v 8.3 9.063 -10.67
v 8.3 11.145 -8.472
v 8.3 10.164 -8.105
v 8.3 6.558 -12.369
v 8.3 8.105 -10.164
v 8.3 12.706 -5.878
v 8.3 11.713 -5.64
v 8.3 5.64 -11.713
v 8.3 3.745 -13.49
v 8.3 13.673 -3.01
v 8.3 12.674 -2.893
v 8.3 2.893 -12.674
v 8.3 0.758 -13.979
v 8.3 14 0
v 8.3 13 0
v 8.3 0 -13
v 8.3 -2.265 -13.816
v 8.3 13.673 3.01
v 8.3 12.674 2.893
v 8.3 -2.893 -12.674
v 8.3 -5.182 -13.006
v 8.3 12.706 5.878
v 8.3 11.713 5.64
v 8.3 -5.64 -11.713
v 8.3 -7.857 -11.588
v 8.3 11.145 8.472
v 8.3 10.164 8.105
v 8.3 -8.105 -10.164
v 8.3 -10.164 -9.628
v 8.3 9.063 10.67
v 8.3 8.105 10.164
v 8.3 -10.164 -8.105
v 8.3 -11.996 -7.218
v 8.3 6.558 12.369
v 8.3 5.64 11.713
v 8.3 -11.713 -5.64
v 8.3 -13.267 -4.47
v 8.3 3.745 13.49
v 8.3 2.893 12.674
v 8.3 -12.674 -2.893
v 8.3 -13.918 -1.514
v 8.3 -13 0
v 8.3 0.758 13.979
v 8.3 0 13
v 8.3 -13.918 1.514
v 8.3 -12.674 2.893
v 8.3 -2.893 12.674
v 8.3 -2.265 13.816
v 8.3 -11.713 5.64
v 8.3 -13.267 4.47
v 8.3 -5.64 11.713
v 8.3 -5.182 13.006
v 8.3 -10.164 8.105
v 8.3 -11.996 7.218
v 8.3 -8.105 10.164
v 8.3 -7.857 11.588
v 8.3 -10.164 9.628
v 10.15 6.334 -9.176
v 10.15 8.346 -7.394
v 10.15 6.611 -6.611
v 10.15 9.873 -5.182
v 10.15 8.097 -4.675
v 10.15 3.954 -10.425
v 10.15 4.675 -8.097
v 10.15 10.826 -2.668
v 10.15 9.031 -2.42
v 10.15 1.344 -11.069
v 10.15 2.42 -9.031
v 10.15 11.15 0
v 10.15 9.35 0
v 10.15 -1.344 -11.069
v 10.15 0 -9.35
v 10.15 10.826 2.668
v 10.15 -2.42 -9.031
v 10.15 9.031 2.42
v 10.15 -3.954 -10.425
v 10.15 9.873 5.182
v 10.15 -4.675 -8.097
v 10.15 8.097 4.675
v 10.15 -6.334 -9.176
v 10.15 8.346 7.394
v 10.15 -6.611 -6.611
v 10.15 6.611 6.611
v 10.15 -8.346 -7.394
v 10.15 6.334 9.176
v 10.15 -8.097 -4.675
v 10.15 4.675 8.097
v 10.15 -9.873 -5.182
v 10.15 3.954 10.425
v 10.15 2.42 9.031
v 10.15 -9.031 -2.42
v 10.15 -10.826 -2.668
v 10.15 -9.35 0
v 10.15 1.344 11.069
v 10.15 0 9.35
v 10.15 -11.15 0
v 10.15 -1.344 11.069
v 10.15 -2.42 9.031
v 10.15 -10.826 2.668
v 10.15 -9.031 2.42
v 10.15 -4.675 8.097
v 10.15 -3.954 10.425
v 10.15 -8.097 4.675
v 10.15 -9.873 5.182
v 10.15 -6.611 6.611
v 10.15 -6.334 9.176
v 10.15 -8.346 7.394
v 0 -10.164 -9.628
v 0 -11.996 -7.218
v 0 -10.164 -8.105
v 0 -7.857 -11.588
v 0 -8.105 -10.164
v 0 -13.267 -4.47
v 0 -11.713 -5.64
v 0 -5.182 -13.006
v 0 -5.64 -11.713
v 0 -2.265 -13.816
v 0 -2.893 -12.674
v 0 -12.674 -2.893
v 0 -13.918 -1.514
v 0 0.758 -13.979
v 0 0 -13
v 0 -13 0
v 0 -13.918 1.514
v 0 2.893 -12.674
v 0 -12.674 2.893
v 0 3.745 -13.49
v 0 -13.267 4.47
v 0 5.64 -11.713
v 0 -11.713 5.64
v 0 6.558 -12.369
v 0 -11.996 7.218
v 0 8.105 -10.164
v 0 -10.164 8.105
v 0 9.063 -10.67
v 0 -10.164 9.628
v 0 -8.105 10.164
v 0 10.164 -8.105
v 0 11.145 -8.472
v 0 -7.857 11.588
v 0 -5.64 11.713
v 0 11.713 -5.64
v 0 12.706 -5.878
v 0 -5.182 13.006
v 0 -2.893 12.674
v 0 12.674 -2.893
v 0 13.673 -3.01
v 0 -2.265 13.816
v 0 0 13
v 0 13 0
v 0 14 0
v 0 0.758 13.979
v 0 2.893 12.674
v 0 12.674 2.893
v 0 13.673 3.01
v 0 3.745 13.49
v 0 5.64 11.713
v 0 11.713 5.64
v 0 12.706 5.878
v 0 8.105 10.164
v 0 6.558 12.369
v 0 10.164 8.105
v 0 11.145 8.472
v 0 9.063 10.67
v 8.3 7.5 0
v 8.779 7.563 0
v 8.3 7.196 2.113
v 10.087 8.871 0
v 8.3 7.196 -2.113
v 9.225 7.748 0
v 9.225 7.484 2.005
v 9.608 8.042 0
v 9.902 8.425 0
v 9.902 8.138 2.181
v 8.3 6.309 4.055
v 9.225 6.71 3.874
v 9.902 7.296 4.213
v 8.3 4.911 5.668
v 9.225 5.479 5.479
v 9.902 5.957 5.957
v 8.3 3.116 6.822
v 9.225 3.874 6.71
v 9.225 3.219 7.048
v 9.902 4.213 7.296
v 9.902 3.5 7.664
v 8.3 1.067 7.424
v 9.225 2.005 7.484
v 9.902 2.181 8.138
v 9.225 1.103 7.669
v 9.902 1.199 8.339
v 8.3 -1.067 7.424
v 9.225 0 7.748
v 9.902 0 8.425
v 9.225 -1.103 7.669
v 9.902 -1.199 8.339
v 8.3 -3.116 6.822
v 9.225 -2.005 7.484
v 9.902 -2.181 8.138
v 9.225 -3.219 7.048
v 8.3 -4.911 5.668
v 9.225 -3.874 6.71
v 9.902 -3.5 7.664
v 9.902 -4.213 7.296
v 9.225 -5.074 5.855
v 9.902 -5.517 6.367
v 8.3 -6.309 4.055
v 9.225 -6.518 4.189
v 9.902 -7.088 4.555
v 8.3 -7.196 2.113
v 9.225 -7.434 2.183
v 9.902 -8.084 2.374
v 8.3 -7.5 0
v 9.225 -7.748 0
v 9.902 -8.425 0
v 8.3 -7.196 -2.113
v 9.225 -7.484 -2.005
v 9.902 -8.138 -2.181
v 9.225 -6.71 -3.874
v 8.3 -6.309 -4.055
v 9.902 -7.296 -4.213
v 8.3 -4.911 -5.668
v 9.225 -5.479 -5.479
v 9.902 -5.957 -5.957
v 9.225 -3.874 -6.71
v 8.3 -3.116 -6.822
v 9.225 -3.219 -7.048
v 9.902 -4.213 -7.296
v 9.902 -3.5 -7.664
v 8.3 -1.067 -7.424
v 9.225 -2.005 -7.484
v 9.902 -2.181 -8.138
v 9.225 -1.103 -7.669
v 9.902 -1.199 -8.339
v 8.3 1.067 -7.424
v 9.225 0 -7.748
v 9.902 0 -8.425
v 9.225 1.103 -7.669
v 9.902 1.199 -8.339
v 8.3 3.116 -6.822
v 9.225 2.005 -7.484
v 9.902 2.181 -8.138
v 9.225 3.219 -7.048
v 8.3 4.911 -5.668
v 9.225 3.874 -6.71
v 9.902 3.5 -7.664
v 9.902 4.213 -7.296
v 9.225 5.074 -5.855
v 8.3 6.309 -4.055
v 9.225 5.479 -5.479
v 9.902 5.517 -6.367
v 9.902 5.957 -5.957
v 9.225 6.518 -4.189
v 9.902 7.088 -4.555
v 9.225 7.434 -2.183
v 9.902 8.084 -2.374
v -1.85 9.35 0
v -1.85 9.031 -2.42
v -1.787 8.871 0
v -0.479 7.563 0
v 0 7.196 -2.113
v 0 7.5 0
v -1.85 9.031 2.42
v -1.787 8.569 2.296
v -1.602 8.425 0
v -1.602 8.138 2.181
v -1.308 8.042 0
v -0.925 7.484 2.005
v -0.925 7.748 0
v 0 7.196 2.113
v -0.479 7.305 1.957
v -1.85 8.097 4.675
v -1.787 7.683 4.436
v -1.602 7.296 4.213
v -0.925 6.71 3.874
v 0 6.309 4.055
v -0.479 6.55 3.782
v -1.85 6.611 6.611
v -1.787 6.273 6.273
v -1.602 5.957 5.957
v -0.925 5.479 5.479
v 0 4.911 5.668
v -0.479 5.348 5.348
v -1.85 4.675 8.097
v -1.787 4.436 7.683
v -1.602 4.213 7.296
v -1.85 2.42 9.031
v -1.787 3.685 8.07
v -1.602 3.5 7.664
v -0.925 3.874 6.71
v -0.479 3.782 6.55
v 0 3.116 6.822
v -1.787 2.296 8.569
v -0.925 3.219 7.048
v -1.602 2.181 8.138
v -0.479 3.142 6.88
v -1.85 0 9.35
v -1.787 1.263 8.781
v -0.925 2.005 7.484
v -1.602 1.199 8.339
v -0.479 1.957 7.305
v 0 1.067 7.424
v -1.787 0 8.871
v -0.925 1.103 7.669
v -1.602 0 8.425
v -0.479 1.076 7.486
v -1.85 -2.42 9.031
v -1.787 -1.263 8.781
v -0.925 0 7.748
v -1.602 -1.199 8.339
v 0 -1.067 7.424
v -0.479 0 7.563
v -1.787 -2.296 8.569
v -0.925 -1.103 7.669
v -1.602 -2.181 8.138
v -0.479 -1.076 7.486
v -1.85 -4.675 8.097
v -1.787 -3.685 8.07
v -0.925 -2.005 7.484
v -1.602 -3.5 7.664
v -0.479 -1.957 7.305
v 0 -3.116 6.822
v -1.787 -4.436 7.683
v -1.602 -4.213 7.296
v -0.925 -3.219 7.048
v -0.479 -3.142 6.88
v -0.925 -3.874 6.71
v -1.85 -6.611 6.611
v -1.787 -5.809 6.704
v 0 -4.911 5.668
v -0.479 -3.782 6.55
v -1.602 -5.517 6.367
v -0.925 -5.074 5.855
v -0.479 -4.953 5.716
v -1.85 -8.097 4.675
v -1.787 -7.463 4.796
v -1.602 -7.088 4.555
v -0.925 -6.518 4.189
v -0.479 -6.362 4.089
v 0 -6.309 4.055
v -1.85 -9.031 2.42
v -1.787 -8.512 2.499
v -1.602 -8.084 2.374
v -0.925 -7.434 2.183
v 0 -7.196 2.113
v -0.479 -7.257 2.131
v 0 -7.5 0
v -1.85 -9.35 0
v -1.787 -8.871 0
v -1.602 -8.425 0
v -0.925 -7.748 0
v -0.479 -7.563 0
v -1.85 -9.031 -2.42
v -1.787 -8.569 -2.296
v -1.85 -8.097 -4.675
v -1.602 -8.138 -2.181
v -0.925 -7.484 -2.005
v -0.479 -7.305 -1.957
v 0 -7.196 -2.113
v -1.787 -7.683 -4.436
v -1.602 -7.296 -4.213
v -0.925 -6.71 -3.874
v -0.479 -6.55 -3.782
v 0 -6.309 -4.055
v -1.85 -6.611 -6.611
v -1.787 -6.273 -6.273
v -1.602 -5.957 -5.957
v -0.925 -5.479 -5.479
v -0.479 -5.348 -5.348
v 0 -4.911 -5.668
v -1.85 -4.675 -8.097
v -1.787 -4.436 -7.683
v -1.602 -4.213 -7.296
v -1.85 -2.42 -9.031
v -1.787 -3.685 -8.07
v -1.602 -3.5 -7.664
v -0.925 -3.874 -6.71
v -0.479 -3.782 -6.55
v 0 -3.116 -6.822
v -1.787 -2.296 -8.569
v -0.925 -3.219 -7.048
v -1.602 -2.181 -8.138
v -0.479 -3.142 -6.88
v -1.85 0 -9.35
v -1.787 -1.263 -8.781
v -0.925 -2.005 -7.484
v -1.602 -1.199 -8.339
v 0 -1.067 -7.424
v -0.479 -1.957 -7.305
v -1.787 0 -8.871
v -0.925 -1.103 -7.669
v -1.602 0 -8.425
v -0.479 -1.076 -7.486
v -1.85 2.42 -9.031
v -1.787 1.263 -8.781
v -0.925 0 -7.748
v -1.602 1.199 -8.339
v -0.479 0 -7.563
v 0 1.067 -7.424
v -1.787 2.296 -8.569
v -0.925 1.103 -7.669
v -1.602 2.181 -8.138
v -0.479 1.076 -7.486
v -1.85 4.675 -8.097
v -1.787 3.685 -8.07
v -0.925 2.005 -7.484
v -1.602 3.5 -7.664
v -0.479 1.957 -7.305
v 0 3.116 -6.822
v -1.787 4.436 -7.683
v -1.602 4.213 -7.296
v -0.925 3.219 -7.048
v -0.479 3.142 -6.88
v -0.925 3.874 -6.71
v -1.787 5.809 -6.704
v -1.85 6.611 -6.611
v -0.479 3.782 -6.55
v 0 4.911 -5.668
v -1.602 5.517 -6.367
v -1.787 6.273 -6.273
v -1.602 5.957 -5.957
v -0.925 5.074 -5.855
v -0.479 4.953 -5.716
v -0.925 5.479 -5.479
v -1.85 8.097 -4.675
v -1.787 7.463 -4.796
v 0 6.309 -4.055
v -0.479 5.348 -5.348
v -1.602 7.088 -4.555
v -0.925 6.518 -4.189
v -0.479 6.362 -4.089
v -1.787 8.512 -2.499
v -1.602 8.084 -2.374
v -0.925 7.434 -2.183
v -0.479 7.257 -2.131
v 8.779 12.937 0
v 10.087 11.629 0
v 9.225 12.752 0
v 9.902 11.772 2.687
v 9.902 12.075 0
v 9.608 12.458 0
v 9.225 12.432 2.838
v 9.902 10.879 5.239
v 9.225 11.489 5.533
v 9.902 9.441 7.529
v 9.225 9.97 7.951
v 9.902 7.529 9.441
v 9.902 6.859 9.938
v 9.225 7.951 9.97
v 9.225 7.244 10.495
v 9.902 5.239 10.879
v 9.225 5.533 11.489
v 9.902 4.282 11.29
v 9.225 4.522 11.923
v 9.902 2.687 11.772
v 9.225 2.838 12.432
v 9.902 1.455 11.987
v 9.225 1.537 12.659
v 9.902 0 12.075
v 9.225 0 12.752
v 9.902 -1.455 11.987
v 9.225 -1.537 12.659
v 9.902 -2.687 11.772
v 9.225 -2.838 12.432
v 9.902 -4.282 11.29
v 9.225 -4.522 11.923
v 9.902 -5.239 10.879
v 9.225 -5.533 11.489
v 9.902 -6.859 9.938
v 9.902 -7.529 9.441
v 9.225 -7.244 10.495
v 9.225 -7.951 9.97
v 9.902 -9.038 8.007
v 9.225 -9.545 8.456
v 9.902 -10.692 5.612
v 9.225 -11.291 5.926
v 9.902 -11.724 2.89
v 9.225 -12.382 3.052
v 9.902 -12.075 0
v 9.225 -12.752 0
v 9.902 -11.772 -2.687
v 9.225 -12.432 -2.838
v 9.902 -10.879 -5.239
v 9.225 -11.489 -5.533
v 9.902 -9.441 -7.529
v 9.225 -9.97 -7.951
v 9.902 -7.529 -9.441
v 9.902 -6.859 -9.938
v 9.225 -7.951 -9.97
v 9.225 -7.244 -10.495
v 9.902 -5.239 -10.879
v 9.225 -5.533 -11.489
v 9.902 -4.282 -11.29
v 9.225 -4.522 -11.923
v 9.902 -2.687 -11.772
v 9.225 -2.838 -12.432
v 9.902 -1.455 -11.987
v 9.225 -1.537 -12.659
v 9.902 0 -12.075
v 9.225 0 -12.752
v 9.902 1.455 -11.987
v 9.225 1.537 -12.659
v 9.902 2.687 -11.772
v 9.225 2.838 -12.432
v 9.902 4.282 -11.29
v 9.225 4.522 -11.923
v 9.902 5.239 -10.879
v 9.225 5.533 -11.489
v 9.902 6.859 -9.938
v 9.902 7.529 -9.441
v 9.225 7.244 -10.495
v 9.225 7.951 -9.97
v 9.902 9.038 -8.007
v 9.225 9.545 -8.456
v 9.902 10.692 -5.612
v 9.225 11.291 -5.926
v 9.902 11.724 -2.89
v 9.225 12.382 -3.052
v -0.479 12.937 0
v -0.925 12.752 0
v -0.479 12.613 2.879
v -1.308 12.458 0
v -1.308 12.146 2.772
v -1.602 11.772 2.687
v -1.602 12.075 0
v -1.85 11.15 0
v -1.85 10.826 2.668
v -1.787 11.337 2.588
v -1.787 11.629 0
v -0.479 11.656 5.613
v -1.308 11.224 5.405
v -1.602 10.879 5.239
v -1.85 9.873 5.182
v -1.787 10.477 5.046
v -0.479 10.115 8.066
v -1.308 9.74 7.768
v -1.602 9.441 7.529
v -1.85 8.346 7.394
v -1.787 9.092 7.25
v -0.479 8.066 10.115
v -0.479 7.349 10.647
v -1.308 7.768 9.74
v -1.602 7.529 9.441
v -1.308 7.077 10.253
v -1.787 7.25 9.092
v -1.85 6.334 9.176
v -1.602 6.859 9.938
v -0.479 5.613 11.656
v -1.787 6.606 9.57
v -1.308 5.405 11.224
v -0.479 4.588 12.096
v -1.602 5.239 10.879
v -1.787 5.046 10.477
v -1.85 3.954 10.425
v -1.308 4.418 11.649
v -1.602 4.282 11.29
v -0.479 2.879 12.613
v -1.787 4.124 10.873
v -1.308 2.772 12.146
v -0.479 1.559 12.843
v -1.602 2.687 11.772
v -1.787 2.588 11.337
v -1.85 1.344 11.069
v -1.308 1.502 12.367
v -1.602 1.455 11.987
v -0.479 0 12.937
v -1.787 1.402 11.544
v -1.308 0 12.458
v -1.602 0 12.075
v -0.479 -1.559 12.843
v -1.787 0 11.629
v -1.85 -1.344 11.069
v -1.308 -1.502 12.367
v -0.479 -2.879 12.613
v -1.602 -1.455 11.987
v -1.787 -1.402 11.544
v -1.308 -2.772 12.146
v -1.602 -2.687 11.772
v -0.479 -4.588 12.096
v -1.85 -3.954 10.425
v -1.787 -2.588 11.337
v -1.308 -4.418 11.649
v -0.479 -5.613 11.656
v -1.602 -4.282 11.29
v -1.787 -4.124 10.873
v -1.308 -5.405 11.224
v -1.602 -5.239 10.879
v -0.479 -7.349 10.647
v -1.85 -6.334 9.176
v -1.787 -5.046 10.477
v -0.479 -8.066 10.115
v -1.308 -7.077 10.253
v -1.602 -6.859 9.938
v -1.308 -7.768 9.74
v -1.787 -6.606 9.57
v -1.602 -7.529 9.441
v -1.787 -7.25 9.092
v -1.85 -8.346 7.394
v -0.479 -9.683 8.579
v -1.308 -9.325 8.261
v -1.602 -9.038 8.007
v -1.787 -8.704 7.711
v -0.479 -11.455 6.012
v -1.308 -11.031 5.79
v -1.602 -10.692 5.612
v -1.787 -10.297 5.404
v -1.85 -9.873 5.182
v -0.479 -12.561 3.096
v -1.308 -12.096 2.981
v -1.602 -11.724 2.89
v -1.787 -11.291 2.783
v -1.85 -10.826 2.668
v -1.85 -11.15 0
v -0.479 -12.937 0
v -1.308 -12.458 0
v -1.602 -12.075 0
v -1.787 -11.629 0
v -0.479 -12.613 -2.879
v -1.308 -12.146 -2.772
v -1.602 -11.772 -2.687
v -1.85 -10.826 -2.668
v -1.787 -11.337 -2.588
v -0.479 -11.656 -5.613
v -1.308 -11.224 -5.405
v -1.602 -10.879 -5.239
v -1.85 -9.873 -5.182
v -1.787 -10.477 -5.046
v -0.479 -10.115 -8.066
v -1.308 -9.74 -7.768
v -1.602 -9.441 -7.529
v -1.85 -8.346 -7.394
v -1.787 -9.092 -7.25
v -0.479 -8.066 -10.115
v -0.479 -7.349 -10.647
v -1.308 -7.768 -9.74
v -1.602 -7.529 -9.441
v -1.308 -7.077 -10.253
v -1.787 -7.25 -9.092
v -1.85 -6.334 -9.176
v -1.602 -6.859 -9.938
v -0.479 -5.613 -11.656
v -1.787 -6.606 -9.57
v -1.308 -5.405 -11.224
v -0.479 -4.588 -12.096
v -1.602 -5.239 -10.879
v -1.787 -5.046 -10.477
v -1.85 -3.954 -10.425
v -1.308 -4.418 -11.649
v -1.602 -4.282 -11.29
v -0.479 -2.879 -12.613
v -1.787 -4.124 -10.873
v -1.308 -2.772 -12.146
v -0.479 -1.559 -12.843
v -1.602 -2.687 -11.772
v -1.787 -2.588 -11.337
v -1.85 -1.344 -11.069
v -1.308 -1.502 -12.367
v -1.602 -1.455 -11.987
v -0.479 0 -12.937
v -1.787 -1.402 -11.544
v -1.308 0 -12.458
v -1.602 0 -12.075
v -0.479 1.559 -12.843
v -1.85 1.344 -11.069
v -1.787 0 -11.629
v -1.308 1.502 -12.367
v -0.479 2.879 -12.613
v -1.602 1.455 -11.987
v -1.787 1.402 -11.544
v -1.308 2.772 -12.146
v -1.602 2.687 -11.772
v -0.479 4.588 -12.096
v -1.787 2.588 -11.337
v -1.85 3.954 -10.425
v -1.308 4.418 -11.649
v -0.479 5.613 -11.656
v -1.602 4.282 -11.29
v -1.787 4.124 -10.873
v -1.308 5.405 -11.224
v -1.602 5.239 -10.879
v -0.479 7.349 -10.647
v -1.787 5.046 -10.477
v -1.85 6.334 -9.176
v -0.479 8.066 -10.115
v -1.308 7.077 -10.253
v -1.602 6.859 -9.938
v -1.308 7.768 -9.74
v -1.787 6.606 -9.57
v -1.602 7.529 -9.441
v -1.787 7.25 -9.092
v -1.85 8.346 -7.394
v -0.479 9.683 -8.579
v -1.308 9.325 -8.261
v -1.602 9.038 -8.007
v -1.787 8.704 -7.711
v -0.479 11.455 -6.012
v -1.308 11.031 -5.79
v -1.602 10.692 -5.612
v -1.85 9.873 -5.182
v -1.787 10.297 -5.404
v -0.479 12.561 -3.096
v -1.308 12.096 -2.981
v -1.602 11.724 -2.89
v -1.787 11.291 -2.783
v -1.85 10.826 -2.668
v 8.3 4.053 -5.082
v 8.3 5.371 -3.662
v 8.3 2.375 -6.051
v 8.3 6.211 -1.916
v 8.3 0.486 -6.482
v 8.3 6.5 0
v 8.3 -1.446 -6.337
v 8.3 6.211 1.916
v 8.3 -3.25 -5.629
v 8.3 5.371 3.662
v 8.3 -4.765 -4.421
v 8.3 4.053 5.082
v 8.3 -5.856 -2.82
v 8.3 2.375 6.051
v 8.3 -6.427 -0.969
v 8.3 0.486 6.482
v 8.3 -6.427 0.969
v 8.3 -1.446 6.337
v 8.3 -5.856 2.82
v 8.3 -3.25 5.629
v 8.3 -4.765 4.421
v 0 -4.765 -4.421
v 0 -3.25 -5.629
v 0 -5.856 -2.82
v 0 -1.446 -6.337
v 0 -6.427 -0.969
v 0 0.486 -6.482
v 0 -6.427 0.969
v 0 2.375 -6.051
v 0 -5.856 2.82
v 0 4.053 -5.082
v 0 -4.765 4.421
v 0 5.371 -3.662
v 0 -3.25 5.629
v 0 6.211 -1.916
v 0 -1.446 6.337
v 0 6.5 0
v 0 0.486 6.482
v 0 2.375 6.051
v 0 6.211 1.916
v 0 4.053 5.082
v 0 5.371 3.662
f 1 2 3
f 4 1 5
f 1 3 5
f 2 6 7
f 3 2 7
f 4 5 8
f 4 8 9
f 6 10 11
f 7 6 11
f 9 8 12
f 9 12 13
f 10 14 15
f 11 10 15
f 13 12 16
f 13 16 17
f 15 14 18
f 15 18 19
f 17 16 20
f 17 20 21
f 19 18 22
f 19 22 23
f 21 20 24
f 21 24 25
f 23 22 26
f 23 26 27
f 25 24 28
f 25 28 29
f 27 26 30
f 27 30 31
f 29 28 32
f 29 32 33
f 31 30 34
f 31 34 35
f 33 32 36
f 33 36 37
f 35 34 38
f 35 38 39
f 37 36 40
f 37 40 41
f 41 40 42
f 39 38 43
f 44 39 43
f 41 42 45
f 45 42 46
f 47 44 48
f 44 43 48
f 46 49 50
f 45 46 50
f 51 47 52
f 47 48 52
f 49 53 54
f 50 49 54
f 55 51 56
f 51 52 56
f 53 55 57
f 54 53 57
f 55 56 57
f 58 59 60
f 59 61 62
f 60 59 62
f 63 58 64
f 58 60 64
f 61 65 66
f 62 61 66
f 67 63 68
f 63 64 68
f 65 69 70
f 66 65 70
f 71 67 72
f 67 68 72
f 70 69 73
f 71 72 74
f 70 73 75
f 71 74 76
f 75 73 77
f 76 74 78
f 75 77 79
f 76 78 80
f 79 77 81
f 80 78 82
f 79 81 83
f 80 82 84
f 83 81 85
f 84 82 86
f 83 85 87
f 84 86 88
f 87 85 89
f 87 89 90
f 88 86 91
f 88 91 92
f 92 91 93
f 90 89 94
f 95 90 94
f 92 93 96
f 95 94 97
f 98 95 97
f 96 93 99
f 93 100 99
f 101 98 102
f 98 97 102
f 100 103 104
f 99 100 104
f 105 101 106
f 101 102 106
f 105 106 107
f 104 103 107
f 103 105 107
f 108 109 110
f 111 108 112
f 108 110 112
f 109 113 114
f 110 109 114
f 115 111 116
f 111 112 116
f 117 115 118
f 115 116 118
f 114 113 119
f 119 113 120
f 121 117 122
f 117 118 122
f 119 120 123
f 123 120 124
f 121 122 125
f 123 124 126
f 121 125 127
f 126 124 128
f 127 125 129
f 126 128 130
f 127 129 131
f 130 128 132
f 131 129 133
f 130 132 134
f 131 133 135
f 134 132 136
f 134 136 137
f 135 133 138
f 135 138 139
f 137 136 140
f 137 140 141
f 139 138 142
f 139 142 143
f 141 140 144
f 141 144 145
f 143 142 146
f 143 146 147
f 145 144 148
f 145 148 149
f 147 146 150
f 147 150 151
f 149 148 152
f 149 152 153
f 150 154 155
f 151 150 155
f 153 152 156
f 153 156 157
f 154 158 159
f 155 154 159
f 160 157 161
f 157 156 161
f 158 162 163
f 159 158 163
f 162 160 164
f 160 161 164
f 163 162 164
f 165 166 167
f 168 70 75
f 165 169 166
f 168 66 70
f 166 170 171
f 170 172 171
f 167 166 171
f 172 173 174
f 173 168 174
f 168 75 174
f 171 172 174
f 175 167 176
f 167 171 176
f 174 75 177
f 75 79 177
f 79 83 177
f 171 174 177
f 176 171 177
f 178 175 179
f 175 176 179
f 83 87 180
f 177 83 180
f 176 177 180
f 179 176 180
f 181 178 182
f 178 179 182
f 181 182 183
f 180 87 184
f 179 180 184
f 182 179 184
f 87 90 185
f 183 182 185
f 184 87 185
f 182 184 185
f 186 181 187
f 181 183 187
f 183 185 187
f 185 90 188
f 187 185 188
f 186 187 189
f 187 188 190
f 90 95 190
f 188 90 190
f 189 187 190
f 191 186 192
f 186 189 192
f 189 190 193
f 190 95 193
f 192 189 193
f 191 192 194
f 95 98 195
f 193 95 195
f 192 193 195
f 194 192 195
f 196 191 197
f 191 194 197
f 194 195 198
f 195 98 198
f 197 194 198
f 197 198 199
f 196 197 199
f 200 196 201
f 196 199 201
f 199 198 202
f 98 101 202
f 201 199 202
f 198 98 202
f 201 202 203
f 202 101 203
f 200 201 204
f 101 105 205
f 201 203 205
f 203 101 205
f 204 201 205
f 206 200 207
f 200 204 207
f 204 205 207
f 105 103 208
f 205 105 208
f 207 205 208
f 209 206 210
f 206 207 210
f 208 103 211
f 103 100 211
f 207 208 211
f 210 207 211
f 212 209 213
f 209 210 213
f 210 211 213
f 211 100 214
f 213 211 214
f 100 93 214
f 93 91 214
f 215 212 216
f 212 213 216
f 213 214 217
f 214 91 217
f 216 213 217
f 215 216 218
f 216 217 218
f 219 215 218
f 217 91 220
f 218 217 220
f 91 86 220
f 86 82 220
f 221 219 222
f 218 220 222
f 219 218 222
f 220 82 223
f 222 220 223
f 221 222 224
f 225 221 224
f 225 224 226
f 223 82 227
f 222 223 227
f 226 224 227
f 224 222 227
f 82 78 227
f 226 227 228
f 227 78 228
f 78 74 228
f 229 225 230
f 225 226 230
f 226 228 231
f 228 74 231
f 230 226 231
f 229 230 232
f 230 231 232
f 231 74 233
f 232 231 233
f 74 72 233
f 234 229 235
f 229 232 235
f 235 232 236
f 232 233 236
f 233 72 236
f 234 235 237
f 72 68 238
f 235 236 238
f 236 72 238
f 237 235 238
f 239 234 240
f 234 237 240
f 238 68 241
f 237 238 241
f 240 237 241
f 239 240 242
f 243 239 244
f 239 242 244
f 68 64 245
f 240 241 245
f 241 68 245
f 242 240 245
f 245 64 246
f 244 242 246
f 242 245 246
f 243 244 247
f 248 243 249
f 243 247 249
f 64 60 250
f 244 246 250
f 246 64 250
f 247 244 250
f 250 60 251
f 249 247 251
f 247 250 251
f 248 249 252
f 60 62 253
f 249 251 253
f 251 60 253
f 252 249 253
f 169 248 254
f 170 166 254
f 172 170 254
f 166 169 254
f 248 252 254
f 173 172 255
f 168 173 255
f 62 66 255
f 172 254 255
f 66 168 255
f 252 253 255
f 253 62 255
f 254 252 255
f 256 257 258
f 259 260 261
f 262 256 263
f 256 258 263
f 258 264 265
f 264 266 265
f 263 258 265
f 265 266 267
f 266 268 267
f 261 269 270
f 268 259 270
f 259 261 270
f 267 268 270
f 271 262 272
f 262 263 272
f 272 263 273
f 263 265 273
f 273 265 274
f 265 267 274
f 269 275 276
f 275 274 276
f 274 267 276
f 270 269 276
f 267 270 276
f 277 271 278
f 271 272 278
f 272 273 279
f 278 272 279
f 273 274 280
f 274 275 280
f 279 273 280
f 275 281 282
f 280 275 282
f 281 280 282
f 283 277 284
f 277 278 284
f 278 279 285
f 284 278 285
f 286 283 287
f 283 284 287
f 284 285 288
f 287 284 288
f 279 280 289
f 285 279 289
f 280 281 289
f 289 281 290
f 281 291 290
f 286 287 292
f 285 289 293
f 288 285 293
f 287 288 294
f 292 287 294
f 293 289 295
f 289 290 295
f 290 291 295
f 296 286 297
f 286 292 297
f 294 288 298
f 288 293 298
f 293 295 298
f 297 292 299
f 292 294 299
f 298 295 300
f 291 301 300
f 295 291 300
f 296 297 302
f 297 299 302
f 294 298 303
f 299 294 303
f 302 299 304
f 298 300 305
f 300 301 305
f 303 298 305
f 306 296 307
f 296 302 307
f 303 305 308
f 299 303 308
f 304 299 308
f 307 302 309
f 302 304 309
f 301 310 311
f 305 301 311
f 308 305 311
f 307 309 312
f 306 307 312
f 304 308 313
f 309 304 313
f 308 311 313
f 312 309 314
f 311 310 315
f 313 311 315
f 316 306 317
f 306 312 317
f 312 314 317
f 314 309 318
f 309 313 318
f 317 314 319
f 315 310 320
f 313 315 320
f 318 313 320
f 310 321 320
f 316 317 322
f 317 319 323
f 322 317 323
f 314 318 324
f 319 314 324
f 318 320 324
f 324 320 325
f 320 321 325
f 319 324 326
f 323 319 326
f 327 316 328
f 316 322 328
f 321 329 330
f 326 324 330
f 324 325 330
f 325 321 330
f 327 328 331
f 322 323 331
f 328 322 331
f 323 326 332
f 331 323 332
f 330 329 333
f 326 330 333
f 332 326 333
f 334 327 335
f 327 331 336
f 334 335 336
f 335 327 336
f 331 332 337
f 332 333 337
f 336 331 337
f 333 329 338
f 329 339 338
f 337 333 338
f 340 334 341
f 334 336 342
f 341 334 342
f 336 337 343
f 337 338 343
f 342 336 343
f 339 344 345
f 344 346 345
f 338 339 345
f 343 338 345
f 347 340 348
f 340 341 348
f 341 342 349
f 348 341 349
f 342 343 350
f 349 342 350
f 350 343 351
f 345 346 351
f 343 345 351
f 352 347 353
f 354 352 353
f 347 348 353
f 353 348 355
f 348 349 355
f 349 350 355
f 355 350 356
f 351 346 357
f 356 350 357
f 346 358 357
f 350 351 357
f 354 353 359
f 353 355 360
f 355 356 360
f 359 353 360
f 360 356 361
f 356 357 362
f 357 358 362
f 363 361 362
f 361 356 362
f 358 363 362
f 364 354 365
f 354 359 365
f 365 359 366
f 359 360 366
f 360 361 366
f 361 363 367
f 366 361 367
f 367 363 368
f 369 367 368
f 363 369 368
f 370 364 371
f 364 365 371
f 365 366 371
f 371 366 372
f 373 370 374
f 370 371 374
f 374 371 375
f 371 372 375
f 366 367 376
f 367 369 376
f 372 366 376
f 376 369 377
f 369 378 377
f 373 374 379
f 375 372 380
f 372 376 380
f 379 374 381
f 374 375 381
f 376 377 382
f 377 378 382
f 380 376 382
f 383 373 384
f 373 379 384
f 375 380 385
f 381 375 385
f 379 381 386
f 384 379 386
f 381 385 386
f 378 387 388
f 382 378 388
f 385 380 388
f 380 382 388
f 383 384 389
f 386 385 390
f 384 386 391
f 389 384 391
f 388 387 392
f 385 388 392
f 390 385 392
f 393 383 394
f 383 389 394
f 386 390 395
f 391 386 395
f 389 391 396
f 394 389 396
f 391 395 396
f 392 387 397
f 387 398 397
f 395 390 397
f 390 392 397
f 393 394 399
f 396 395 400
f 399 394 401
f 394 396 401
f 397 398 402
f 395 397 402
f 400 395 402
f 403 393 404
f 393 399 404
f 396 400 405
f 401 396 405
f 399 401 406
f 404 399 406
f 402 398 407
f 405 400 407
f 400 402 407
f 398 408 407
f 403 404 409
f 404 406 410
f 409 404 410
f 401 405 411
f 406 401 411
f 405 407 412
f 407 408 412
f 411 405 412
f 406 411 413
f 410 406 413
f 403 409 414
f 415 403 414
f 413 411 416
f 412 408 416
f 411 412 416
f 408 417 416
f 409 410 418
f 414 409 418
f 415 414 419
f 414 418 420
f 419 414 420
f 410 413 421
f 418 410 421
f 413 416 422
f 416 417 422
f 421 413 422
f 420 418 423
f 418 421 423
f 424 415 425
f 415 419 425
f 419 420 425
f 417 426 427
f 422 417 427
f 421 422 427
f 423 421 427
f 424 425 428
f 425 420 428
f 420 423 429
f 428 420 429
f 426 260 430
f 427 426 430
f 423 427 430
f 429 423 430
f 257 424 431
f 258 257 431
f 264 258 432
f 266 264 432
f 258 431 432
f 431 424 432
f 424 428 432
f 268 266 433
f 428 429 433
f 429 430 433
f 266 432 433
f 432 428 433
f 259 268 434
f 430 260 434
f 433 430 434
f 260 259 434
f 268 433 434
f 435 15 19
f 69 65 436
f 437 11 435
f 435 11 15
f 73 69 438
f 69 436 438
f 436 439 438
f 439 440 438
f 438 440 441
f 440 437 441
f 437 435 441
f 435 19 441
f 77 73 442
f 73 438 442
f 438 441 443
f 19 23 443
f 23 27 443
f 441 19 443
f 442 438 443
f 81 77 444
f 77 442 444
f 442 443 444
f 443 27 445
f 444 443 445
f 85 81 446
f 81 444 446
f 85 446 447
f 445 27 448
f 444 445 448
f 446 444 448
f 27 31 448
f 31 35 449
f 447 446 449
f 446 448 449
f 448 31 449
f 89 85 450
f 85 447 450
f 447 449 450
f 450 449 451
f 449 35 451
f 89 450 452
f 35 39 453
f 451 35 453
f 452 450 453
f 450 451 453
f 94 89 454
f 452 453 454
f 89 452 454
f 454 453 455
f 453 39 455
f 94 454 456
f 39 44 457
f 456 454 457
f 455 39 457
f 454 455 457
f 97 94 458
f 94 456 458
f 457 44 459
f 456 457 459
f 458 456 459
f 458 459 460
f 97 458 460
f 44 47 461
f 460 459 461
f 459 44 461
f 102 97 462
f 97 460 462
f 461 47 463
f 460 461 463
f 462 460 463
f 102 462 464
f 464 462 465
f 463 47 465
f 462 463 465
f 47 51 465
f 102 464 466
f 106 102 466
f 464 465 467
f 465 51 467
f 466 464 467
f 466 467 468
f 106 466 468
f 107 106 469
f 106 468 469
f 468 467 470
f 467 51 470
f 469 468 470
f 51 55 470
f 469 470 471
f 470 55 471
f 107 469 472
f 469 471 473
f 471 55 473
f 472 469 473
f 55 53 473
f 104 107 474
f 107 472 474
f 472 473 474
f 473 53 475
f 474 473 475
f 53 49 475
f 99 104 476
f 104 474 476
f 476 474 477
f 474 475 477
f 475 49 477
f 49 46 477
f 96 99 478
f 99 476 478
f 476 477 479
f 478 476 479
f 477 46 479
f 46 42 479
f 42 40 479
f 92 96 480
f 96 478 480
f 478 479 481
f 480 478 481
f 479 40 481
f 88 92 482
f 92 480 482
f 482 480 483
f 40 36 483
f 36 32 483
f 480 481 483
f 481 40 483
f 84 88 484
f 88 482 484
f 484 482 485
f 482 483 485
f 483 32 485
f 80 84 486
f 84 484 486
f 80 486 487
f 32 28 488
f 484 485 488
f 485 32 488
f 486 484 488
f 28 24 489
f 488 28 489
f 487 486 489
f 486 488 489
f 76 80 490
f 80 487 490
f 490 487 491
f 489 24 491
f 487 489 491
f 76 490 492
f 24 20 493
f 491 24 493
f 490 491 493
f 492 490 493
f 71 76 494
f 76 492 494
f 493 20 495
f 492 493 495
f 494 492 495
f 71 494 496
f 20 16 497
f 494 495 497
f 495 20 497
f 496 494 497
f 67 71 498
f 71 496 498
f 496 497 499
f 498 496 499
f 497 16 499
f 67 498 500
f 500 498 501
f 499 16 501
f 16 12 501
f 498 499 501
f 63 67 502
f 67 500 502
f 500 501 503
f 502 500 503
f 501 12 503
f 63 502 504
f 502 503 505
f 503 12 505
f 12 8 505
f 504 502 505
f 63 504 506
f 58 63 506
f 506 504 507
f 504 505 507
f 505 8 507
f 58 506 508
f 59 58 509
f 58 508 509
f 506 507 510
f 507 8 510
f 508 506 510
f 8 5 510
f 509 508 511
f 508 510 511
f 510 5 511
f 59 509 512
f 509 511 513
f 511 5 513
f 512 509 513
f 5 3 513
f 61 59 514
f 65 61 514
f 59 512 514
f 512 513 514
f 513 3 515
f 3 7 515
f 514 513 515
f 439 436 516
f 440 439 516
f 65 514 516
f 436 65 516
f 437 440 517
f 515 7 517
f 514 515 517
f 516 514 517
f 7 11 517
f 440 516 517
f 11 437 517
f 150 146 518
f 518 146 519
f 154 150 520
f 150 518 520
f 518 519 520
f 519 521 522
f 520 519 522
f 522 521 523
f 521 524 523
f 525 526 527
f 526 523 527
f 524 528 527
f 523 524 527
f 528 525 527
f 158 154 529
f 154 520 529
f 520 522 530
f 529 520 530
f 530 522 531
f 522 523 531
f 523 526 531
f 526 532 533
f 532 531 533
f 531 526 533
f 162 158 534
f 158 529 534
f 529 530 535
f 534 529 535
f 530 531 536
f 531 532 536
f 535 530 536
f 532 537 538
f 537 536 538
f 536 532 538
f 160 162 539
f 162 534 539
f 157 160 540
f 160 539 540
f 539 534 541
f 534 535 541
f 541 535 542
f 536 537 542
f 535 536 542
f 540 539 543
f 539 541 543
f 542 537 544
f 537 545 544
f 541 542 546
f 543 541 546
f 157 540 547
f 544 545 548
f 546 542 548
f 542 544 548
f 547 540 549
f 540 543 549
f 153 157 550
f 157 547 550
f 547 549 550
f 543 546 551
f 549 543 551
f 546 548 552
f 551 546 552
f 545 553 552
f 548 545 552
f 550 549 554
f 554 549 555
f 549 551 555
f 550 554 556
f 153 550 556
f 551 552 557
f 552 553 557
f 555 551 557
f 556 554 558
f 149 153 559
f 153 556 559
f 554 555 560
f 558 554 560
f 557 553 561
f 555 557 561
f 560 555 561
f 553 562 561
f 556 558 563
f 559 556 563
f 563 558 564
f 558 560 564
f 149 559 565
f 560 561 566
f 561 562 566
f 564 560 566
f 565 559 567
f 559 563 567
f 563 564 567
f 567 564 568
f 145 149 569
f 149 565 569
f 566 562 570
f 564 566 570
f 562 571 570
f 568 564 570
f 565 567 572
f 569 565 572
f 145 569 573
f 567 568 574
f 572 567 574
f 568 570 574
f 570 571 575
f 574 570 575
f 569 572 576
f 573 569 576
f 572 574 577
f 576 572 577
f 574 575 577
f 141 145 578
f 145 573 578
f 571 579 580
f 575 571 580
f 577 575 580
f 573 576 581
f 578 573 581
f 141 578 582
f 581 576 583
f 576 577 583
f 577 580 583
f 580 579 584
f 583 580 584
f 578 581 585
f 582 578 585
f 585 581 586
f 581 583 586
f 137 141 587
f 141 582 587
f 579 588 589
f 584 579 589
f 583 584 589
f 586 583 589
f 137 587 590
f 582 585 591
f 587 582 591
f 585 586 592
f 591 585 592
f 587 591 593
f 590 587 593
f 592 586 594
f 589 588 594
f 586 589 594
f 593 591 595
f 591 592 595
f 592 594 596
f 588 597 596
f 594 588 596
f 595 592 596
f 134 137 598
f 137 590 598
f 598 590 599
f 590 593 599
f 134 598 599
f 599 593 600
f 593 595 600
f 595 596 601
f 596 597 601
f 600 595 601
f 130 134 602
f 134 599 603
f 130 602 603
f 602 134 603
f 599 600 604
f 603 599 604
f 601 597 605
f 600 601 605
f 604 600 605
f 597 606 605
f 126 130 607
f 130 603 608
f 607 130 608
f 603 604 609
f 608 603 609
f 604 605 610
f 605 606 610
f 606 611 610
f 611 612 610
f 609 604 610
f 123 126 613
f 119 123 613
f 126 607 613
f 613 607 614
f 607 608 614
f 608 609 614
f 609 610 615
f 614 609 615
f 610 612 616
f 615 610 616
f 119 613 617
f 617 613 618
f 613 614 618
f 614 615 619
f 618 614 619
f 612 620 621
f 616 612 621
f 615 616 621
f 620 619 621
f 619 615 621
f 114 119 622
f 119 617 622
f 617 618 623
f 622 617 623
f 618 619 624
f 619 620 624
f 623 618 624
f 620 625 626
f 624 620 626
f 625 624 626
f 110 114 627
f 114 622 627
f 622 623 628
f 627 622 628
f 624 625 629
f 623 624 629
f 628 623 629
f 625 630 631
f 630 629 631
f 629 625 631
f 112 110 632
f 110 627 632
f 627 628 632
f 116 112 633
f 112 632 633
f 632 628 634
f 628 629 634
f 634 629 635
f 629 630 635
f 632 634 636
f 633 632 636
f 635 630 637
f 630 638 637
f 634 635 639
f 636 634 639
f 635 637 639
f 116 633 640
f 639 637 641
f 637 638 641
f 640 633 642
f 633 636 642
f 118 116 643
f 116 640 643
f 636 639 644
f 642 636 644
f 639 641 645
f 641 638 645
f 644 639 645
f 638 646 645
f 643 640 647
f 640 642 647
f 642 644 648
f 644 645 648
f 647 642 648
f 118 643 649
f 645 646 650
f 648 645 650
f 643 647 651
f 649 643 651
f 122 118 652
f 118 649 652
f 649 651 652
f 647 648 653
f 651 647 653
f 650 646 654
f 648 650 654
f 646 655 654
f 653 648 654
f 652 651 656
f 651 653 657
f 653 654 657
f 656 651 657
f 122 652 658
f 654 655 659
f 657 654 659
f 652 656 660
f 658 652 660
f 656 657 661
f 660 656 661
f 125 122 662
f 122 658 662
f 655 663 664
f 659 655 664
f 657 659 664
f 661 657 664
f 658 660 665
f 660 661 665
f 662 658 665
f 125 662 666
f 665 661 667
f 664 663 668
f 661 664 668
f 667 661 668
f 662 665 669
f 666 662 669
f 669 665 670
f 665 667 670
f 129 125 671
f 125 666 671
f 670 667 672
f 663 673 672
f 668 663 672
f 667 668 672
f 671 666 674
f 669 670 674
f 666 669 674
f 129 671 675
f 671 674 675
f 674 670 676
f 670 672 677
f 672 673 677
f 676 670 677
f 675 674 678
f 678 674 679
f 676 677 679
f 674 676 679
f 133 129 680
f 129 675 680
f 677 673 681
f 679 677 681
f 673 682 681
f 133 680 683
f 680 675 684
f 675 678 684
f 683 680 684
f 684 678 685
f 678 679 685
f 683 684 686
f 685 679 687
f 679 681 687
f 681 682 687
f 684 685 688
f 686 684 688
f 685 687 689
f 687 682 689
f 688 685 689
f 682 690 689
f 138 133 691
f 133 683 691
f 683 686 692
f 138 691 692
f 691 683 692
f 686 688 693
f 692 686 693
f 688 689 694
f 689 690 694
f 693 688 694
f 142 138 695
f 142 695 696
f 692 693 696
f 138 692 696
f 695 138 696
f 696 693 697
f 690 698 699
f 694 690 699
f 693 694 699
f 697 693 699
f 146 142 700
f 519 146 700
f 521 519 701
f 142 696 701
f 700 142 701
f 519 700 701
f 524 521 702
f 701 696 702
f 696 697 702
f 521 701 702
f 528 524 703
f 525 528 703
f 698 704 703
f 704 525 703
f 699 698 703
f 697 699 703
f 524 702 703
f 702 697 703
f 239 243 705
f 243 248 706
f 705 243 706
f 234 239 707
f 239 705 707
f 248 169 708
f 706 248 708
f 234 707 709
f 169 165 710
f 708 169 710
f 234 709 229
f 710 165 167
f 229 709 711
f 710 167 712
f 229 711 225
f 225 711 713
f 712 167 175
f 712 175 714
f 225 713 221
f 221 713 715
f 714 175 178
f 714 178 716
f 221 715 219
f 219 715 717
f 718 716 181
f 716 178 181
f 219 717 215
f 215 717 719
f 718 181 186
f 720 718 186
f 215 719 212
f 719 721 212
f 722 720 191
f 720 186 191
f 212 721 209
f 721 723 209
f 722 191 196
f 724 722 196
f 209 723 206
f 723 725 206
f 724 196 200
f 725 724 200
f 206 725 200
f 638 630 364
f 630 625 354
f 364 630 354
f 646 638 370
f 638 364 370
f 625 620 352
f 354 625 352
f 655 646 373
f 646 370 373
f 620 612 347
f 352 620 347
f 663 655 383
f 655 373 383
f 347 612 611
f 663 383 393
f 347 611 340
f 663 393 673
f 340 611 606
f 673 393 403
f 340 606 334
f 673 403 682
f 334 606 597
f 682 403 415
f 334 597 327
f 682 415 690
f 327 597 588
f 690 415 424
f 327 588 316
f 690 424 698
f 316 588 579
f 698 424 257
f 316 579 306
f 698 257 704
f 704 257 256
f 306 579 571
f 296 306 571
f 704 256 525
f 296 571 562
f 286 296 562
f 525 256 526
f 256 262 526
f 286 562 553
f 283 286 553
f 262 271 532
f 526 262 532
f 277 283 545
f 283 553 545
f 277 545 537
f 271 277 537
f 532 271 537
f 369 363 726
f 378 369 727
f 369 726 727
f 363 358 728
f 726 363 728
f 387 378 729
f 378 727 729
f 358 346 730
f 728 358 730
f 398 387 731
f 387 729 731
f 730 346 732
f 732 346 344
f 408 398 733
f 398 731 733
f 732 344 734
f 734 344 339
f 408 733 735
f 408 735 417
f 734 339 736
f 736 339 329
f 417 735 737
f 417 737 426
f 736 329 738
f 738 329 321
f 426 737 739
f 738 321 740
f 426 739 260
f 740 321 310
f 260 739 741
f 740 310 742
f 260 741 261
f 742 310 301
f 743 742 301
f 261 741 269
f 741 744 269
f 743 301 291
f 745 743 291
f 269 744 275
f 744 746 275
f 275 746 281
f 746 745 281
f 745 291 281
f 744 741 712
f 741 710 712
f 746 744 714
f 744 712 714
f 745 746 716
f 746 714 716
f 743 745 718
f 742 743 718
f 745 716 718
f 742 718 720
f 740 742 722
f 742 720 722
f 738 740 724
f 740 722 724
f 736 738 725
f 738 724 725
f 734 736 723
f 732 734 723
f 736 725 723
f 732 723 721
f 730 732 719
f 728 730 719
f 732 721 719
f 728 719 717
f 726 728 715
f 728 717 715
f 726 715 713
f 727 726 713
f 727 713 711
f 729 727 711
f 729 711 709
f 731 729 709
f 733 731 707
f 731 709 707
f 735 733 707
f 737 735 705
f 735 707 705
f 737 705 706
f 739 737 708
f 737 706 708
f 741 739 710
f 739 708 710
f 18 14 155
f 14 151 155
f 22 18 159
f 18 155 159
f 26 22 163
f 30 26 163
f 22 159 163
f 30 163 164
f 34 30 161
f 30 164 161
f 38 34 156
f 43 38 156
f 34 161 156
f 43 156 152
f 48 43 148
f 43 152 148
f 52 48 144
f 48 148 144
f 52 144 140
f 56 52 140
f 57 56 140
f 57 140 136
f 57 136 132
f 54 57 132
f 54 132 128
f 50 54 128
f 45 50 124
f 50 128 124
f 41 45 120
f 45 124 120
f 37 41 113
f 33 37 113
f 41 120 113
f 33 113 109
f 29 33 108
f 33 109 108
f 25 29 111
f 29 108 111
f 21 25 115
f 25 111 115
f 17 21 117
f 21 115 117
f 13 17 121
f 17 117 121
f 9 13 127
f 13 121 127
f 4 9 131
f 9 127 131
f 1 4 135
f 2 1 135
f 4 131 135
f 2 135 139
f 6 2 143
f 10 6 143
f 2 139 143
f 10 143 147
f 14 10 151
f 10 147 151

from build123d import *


with BuildPart() as part:
    # Sketch1 → Revolve1 (revolve)
    with BuildSketch(Plane.XY):
        with BuildLine():
            Line((10.15, 9.35), (10.15, 11.15))
            ThreePointArc((10.15, 11.15), (9.608147545, 12.458147545), (8.3, 13))
            Line((8.3, 13), (8.3, 14))
            Line((8.3, 14), (0, 14))
            Line((0, 14), (0, 13))
            ThreePointArc((0, 13), (-1.308147545, 12.458147545), (-1.85, 11.15))
            Line((-1.85, 11.15), (-1.85, 9.35))
            ThreePointArc((-1.85, 9.35), (-1.308147545, 8.041852455), (0, 7.5))
            Line((0, 7.5), (0, 6.5))
            Line((0, 6.5), (8.3, 6.5))
            Line((8.3, 6.5), (8.3, 7.5))
            ThreePointArc((8.3, 7.5), (9.608147545, 8.041852455), (10.15, 9.35))
        make_face()
    revolve(axis=Axis((-8.833016473, 0, 0), (1, 0, 0)))


solid = part.part
